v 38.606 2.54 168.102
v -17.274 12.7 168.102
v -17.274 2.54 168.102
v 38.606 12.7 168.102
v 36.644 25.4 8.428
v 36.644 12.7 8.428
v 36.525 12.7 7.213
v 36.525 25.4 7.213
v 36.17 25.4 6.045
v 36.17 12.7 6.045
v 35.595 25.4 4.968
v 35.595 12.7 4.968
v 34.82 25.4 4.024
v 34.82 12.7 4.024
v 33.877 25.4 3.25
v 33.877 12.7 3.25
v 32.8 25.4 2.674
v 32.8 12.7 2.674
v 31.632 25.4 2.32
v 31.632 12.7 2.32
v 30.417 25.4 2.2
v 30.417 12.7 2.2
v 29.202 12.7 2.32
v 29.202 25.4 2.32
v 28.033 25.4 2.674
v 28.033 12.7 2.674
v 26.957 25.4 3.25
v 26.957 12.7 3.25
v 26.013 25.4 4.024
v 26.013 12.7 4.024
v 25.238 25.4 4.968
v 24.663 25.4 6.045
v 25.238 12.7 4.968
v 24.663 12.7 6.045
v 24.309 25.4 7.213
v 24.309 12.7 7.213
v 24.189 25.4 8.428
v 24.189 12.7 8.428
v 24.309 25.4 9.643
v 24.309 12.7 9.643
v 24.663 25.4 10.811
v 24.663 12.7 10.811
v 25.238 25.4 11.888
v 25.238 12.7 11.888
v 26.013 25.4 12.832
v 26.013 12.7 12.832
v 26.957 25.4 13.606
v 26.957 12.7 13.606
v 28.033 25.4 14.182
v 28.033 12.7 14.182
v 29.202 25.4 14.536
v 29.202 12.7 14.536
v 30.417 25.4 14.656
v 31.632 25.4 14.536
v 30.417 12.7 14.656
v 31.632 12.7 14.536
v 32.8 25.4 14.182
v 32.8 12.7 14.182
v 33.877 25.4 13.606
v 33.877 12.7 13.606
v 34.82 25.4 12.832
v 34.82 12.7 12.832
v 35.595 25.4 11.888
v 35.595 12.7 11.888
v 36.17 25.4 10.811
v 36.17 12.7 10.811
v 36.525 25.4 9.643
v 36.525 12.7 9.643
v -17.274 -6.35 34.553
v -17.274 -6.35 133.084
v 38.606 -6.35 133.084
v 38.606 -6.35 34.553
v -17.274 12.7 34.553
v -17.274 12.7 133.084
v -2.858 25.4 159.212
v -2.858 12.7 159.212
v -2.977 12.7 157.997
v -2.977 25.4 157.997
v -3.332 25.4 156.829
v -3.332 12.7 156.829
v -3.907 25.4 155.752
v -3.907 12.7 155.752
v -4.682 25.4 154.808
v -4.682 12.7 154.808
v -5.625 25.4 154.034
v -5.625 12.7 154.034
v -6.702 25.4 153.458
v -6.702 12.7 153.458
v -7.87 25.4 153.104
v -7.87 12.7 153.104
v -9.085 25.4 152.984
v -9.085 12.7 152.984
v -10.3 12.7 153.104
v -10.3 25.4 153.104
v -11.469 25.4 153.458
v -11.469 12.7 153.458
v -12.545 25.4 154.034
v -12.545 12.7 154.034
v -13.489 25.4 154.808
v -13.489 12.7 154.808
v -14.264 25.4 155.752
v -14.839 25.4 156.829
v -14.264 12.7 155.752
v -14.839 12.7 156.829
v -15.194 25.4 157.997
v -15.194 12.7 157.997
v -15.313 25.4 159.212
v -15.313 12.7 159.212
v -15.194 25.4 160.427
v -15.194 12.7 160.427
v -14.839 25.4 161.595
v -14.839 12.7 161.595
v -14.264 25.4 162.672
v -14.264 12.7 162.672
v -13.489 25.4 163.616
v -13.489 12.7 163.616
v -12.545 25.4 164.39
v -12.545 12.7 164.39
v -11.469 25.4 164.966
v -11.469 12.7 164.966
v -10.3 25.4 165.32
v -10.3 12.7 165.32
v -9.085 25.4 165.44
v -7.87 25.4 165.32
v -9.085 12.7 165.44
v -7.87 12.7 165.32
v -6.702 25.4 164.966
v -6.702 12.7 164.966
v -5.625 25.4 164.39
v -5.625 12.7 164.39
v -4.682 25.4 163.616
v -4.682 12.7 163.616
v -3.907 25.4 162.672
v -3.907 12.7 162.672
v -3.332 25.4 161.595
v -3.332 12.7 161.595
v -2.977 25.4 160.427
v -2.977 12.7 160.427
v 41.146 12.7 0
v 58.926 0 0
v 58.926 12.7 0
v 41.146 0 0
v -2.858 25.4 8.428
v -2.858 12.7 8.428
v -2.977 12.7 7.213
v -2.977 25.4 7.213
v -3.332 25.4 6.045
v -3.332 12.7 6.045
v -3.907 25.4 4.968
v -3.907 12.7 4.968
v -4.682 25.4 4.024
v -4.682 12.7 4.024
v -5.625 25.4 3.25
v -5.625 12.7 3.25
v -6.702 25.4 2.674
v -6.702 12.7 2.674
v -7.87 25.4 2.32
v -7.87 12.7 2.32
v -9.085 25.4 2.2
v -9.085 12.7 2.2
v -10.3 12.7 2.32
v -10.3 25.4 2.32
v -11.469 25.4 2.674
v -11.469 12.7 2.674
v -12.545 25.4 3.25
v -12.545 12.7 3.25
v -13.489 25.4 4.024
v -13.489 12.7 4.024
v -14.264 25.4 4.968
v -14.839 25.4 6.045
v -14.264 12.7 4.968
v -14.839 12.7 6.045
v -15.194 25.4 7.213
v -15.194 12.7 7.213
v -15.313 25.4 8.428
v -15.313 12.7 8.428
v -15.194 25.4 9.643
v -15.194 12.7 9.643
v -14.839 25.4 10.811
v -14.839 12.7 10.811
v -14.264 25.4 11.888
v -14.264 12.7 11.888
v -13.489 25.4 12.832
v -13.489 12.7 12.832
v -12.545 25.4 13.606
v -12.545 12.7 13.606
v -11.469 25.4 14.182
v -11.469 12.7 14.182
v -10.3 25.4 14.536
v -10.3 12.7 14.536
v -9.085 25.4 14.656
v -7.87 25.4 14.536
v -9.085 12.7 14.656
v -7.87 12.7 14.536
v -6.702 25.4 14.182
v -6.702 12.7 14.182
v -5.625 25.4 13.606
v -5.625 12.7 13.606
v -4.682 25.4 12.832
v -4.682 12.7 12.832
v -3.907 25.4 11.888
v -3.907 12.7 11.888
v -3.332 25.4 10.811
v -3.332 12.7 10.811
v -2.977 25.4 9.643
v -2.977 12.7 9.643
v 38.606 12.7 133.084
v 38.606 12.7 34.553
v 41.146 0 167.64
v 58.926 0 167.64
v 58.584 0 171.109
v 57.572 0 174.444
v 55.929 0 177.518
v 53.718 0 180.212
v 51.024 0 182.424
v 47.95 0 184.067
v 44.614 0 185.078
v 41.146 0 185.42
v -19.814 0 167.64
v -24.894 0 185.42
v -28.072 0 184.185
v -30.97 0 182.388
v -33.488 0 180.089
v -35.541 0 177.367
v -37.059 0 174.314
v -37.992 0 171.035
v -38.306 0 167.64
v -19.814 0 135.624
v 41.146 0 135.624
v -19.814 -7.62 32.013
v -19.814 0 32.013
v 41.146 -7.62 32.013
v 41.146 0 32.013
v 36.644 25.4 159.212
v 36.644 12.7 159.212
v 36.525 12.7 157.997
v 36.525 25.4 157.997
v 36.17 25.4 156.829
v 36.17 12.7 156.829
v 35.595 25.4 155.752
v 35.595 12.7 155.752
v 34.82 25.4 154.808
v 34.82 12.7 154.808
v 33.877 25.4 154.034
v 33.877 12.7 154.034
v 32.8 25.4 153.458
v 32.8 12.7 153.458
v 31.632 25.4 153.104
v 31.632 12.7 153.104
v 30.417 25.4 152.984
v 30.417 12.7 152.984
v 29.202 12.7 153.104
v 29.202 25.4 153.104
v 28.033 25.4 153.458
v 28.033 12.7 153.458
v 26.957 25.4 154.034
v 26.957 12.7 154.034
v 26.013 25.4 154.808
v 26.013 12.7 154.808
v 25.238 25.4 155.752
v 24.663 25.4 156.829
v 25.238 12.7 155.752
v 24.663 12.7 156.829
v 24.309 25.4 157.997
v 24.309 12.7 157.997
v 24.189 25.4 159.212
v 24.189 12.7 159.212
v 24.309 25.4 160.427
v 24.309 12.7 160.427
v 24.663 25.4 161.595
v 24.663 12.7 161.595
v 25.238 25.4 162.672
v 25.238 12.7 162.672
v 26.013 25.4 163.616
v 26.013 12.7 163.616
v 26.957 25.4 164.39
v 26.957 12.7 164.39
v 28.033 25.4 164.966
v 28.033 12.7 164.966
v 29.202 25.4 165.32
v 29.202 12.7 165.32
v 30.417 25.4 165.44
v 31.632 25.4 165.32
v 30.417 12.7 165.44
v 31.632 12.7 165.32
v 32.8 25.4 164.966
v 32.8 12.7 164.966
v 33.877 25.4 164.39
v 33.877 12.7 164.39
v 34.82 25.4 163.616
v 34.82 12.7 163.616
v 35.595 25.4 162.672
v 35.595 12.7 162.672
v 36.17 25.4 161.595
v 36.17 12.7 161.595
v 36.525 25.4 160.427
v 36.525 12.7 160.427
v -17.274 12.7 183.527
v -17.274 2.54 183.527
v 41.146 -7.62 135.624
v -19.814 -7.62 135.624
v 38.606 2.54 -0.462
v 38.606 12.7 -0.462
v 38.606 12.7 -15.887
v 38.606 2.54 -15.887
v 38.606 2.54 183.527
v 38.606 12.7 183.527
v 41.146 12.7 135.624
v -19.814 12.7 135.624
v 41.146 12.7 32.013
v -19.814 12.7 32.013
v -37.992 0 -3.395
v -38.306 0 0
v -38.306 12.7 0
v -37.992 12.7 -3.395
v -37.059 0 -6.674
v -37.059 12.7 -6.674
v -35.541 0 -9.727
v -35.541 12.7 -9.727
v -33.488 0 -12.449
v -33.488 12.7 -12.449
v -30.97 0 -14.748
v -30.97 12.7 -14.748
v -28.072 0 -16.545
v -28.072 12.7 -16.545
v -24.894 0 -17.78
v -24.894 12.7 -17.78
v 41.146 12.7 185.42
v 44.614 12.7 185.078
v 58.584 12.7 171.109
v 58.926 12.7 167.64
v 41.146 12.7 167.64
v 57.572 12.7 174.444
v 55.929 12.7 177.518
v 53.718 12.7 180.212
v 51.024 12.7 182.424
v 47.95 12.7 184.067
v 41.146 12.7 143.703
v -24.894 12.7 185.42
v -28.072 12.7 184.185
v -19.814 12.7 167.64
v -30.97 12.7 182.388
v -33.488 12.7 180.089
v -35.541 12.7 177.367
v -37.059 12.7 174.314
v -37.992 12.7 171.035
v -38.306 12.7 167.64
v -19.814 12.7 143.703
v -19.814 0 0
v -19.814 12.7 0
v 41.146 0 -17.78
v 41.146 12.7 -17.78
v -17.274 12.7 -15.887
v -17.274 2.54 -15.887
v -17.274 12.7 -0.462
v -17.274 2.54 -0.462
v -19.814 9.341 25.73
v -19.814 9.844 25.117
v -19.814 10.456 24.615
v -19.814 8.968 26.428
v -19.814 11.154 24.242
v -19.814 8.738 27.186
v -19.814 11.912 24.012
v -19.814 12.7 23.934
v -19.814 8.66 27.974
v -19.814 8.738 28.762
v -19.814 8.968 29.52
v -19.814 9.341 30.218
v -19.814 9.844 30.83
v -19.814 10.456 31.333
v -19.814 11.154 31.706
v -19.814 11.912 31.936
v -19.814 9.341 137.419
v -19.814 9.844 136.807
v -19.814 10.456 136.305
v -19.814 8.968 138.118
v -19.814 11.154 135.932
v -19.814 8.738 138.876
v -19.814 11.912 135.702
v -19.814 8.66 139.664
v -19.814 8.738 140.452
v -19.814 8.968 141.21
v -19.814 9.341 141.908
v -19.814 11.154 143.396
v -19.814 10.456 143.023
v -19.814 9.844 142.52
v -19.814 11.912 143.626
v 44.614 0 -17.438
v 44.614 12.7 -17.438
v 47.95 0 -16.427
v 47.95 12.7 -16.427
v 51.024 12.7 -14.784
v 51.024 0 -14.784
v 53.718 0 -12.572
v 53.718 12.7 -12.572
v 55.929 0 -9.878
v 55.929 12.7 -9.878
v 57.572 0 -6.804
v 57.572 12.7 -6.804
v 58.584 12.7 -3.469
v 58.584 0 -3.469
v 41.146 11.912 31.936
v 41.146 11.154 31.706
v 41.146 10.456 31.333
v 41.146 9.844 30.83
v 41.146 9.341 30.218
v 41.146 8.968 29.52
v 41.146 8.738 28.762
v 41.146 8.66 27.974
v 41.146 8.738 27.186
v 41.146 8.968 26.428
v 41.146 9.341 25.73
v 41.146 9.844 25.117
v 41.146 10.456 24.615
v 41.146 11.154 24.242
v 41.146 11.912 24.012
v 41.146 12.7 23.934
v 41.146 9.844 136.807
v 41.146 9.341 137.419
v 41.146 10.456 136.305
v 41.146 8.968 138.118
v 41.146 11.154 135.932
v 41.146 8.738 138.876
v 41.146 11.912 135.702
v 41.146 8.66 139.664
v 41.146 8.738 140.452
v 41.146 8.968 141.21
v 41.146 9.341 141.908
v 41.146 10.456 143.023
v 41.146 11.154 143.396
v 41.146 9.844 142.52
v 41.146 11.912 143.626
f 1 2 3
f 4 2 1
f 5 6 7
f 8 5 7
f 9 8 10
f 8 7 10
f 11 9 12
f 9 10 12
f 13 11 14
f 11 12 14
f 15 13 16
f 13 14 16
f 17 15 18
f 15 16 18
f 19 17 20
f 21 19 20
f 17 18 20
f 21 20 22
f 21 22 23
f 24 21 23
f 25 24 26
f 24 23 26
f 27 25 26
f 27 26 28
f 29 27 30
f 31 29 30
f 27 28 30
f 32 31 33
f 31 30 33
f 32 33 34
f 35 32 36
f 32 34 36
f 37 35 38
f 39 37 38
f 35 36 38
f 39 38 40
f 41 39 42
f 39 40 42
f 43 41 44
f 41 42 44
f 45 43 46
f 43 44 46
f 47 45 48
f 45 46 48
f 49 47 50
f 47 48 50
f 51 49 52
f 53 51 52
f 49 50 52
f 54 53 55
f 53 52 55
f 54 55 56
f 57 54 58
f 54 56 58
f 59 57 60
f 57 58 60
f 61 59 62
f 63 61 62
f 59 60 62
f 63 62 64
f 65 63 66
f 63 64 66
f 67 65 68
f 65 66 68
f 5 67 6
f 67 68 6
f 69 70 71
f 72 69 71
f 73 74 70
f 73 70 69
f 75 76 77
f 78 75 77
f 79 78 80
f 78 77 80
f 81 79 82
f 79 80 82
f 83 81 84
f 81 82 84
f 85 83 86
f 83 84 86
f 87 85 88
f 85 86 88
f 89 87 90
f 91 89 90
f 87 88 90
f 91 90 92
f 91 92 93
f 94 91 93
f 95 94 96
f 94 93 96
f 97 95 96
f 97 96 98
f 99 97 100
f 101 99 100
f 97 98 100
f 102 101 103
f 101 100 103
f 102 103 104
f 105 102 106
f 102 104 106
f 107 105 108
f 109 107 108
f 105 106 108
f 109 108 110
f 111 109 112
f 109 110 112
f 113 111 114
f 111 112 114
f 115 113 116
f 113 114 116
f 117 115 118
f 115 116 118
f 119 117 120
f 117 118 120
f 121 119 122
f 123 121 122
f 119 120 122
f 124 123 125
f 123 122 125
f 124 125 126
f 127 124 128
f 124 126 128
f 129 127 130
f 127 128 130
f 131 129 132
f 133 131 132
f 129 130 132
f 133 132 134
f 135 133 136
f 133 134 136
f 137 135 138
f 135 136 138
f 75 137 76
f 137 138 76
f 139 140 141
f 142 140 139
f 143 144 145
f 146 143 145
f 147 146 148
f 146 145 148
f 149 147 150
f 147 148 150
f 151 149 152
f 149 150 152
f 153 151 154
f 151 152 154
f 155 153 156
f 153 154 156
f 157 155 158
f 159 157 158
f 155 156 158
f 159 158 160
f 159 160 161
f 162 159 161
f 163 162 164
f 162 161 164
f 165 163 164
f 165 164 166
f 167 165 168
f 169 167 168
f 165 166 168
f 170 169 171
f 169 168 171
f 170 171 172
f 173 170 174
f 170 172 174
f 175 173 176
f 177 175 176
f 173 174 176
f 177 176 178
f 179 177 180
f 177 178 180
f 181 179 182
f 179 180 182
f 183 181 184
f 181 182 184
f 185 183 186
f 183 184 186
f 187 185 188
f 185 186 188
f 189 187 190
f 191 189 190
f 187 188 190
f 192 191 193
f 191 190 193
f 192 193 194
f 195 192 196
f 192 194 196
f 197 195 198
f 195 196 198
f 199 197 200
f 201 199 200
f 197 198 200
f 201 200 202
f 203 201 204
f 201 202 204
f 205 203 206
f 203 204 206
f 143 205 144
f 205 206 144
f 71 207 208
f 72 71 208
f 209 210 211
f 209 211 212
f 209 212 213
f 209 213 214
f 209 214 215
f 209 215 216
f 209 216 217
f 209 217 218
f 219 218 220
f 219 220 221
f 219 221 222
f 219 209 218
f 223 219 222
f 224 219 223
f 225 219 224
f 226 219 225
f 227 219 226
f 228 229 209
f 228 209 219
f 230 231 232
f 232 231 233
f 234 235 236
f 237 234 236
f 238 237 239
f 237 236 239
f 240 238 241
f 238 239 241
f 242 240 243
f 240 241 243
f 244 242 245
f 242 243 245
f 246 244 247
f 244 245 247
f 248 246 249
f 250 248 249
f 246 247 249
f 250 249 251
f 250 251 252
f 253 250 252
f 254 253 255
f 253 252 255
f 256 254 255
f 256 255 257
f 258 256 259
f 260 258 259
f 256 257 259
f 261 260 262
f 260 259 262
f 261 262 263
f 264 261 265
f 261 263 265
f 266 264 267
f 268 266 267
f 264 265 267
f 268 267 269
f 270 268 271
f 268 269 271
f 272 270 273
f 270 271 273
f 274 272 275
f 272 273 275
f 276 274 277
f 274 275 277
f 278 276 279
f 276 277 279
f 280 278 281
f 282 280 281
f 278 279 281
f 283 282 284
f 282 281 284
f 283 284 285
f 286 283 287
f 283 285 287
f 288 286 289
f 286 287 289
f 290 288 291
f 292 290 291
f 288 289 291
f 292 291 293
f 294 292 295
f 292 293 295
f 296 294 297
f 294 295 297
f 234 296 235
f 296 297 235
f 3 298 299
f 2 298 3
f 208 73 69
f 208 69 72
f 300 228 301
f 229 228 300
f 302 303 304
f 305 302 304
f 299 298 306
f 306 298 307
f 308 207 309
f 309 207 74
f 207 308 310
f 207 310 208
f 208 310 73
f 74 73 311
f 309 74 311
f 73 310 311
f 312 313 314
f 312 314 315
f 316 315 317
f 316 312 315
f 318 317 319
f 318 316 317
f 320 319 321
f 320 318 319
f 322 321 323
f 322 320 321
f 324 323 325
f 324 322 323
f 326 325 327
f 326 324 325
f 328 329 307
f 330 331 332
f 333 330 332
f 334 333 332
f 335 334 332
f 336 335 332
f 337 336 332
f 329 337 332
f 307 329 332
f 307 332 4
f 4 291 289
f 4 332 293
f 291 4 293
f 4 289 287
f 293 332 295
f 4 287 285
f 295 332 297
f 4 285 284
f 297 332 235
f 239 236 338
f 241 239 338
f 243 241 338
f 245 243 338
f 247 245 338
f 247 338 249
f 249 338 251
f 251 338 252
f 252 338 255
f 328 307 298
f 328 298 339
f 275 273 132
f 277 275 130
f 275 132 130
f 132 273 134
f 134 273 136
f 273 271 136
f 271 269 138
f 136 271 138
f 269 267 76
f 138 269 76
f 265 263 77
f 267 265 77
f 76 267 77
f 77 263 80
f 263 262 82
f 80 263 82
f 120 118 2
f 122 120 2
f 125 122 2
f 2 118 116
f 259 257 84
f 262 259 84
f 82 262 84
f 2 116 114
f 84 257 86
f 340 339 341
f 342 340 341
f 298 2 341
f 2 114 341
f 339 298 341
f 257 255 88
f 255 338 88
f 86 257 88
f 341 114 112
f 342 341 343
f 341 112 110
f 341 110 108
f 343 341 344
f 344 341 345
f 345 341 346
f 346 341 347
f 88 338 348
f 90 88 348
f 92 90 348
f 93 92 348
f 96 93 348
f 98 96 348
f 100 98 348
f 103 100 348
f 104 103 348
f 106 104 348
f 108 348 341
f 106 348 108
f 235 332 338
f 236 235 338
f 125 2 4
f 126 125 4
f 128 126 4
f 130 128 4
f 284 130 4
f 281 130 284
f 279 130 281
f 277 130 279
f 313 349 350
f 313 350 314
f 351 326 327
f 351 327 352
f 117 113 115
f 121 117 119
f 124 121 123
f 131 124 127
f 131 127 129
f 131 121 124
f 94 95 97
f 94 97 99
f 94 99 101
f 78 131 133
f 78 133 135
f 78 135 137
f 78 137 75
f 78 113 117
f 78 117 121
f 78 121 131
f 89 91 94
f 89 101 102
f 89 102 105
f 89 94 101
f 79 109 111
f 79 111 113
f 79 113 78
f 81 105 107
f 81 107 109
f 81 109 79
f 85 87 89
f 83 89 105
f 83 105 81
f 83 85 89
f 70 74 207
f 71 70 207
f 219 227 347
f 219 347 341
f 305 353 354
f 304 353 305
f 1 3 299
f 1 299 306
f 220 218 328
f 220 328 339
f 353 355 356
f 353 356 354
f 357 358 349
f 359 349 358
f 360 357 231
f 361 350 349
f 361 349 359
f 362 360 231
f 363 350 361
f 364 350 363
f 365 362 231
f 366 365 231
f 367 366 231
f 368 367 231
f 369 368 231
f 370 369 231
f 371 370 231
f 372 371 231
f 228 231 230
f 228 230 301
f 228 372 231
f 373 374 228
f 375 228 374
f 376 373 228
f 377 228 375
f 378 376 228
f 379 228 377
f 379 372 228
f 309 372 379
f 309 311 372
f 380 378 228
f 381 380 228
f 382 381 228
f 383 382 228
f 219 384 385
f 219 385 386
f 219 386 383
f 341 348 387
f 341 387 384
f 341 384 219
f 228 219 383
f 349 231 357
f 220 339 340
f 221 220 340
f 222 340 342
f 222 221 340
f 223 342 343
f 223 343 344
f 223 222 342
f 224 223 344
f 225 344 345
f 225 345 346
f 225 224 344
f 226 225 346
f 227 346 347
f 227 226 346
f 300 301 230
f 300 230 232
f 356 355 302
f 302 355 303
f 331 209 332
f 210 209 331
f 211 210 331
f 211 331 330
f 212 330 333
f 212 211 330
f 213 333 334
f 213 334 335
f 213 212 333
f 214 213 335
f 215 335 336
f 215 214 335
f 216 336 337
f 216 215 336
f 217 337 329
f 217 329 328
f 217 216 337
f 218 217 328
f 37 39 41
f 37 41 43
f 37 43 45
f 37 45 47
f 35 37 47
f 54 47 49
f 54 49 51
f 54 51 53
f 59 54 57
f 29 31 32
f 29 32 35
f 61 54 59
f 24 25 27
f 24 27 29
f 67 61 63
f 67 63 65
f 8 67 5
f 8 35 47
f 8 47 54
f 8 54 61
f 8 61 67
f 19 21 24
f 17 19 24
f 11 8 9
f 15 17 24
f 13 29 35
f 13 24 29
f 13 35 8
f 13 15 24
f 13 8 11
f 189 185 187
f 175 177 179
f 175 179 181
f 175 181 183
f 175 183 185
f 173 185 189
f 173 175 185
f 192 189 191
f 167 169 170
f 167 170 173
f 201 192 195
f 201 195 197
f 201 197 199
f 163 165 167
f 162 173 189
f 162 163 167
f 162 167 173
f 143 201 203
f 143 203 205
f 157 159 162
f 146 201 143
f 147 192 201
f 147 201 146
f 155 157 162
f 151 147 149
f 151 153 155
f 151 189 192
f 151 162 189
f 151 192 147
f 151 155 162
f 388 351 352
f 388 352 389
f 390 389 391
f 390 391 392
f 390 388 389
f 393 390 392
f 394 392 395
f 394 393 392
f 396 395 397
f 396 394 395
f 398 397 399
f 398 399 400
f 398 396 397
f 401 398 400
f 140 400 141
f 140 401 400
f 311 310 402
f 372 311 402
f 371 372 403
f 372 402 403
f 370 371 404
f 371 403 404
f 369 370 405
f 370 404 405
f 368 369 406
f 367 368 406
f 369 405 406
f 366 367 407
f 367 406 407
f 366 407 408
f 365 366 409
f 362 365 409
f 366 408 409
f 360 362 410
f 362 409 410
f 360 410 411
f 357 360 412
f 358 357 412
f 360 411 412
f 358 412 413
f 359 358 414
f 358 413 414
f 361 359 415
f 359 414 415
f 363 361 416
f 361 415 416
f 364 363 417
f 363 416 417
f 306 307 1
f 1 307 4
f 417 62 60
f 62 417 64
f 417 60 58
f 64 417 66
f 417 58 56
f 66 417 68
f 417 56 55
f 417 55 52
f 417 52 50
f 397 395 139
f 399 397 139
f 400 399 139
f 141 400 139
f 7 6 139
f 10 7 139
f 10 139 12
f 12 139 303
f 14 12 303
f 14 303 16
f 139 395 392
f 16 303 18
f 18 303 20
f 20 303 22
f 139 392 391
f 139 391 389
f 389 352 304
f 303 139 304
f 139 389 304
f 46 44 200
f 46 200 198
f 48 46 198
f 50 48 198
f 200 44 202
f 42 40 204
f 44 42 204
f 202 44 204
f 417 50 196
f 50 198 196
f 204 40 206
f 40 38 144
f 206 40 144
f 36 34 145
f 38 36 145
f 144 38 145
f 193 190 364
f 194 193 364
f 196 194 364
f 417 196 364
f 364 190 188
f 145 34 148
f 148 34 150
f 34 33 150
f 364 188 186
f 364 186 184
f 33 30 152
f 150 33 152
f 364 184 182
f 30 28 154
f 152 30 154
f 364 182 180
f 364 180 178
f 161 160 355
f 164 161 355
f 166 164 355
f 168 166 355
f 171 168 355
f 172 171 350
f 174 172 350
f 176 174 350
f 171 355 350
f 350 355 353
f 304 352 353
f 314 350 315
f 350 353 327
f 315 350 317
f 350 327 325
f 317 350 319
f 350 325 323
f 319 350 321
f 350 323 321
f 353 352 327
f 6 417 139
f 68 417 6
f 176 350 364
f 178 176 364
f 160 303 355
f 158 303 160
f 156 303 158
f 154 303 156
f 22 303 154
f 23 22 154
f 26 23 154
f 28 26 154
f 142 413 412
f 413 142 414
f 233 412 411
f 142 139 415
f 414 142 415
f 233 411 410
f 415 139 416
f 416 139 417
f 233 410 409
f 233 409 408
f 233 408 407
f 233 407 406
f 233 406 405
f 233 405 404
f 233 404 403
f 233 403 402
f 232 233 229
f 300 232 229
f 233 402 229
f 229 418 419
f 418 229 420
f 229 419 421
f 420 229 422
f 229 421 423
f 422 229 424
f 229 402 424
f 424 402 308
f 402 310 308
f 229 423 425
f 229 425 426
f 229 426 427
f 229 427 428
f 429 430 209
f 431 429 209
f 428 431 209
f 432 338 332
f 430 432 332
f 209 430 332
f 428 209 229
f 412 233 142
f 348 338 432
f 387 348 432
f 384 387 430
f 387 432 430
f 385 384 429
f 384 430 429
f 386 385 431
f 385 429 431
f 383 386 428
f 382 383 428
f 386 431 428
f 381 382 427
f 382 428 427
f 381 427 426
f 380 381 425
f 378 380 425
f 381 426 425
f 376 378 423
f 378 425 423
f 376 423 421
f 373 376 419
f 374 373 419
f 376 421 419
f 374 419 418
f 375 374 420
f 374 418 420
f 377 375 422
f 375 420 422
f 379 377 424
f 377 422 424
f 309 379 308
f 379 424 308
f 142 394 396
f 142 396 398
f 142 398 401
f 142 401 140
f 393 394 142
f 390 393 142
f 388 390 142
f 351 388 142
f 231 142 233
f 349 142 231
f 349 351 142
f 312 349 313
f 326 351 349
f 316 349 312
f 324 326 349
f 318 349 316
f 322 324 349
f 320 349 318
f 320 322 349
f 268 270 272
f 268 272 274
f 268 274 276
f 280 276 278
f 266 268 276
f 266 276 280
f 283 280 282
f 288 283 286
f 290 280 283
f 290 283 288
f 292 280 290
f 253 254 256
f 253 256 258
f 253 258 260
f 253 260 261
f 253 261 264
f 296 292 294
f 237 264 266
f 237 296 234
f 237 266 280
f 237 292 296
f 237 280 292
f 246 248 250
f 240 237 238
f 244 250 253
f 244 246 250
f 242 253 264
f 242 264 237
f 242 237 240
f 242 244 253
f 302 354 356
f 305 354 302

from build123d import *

# Parameters (mm, degrees)
BOSS_EXTRUDE1_DEPTH     = 12.7
SKETCH3_R               = 4.039553008
CUT_EXTRUDE1_DEPTH      = 80.451479119
SKETCH4_R               = 6.227777938
BOSS_EXTRUDE3_DEPTH     = 12.7
SKETCH5_W               = 55.88
SKETCH5_H               = 98.530771833
CUT_EXTRUDE2_DEPTH      = 13.7
CUT_EXTRUDE2_DEPTH_BACK = 13.7
SKETCH6_W               = 55.88
SKETCH6_H               = 15.424799931
CUT_EXTRUDE3_DEPTH      = 10.16
SKETCH7_W               = 60.96
SKETCH7_H               = 103.610771833
BOSS_EXTRUDE4_DEPTH     = 7.62
SKETCH8_W               = 55.88
SKETCH8_H               = 98.530771833
CUT_EXTRUDE4_DEPTH      = 6.35


with BuildPart() as part:
    # Sketch1 → Boss-Extrude1 (new body)
    with BuildSketch(Plane(origin=(0, 0, 0), x_dir=(1, 0, 0), z_dir=(0, 1, 0))):
        with BuildLine():
            Line((-24.894407518, 17.78), (41.145592482, 17.78))
            ThreePointArc((41.145592482, 17.78), (53.717951052, 12.572358569), (58.925592482, 0))
            Line((58.925592482, 0), (41.145592482, 0))
            Line((41.145592482, 0), (41.145592482, -167.64))
            Line((41.145592482, -167.64), (58.925592482, -167.64))
            ThreePointArc((58.925592482, -167.64), (53.717951052, -180.212358569), (41.145592482, -185.42))
            Line((41.145592482, -185.42), (-24.894407518, -185.42))
            ThreePointArc((-24.894407518, -185.42), (-34.577054874, -178.775485757), (-38.305886636, -167.64))
            Line((-38.305886636, -167.64), (-19.814407518, -167.64))
            Line((-19.814407518, -167.64), (-19.814407518, 0))
            Line((-19.814407518, 0), (-38.305886636, 0))
            ThreePointArc((-38.305886636, 0), (-34.577054874, 11.135485757), (-24.894407518, 17.78))
        make_face()
    extrude(amount=BOSS_EXTRUDE1_DEPTH)

    # Sketch3 → Cut-Extrude1 (cut, through all)
    with BuildSketch(Plane(origin=(41.145592482, 0, 0), x_dir=(0, 0, -1), z_dir=(1, 0, 0))):
        with Locations((-139.663754312, 12.7)):
            Circle(SKETCH3_R)
        with Locations((-27.973876463, 12.7)):
            Circle(SKETCH3_R)
    extrude(amount=-CUT_EXTRUDE1_DEPTH, mode=Mode.SUBTRACT)

    # Sketch4 → Boss-Extrude3 (add)
    with BuildSketch(Plane(origin=(0, 12.7, 0), x_dir=(1, 0, 0), z_dir=(0, 1, 0))):
        with Locations((30.41662766, -8.42802752)):
            Circle(SKETCH4_R)
        with Locations((30.41662766, -159.21197248)):
            Circle(SKETCH4_R)
        with Locations((-9.085442695, -159.21197248)):
            Circle(SKETCH4_R)
        with Locations((-9.085442695, -8.42802752)):
            Circle(SKETCH4_R)
    extrude(amount=BOSS_EXTRUDE3_DEPTH)

    # Sketch5 → Cut-Extrude2 (cut, two sides)
    with BuildSketch(Plane(origin=(0, 12.7, 0), x_dir=(1, 0, 0), z_dir=(0, 1, 0))) as cut_extrude2_sk:
        with Locations((10.665592482, -83.818815387)):
            Rectangle(SKETCH5_W, SKETCH5_H)
    extrude(amount=CUT_EXTRUDE2_DEPTH, mode=Mode.SUBTRACT)
    extrude(cut_extrude2_sk.sketch, amount=-CUT_EXTRUDE2_DEPTH_BACK, mode=Mode.SUBTRACT)

    # Sketch6 → Cut-Extrude3 (cut)
    with BuildSketch(Plane(origin=(0, 12.7, 0), x_dir=(1, 0, 0), z_dir=(0, 1, 0))):
        with Locations((10.665592482, -175.814372445)):
            Rectangle(SKETCH6_W, SKETCH6_H)
        with Locations((10.665592482, 8.174372446)):
            Rectangle(SKETCH6_W, SKETCH6_H)
    extrude(amount=-CUT_EXTRUDE3_DEPTH, mode=Mode.SUBTRACT)

    # Sketch7 → Boss-Extrude4 (add)
    with BuildSketch(Plane.XZ):
        with Locations((10.665592482, 83.818815387)):
            Rectangle(SKETCH7_W, SKETCH7_H)
    extrude(amount=BOSS_EXTRUDE4_DEPTH)

    # Sketch8 → Cut-Extrude4 (cut, symmetric)
    with BuildSketch(Plane(origin=(0, 0, 0), x_dir=(1, 0, 0), z_dir=(0, 1, 0))):
        with Locations((10.665592482, -83.818815387)):
            Rectangle(SKETCH8_W, SKETCH8_H)
    extrude(amount=CUT_EXTRUDE4_DEPTH, both=True, mode=Mode.SUBTRACT)


solid = part.part
